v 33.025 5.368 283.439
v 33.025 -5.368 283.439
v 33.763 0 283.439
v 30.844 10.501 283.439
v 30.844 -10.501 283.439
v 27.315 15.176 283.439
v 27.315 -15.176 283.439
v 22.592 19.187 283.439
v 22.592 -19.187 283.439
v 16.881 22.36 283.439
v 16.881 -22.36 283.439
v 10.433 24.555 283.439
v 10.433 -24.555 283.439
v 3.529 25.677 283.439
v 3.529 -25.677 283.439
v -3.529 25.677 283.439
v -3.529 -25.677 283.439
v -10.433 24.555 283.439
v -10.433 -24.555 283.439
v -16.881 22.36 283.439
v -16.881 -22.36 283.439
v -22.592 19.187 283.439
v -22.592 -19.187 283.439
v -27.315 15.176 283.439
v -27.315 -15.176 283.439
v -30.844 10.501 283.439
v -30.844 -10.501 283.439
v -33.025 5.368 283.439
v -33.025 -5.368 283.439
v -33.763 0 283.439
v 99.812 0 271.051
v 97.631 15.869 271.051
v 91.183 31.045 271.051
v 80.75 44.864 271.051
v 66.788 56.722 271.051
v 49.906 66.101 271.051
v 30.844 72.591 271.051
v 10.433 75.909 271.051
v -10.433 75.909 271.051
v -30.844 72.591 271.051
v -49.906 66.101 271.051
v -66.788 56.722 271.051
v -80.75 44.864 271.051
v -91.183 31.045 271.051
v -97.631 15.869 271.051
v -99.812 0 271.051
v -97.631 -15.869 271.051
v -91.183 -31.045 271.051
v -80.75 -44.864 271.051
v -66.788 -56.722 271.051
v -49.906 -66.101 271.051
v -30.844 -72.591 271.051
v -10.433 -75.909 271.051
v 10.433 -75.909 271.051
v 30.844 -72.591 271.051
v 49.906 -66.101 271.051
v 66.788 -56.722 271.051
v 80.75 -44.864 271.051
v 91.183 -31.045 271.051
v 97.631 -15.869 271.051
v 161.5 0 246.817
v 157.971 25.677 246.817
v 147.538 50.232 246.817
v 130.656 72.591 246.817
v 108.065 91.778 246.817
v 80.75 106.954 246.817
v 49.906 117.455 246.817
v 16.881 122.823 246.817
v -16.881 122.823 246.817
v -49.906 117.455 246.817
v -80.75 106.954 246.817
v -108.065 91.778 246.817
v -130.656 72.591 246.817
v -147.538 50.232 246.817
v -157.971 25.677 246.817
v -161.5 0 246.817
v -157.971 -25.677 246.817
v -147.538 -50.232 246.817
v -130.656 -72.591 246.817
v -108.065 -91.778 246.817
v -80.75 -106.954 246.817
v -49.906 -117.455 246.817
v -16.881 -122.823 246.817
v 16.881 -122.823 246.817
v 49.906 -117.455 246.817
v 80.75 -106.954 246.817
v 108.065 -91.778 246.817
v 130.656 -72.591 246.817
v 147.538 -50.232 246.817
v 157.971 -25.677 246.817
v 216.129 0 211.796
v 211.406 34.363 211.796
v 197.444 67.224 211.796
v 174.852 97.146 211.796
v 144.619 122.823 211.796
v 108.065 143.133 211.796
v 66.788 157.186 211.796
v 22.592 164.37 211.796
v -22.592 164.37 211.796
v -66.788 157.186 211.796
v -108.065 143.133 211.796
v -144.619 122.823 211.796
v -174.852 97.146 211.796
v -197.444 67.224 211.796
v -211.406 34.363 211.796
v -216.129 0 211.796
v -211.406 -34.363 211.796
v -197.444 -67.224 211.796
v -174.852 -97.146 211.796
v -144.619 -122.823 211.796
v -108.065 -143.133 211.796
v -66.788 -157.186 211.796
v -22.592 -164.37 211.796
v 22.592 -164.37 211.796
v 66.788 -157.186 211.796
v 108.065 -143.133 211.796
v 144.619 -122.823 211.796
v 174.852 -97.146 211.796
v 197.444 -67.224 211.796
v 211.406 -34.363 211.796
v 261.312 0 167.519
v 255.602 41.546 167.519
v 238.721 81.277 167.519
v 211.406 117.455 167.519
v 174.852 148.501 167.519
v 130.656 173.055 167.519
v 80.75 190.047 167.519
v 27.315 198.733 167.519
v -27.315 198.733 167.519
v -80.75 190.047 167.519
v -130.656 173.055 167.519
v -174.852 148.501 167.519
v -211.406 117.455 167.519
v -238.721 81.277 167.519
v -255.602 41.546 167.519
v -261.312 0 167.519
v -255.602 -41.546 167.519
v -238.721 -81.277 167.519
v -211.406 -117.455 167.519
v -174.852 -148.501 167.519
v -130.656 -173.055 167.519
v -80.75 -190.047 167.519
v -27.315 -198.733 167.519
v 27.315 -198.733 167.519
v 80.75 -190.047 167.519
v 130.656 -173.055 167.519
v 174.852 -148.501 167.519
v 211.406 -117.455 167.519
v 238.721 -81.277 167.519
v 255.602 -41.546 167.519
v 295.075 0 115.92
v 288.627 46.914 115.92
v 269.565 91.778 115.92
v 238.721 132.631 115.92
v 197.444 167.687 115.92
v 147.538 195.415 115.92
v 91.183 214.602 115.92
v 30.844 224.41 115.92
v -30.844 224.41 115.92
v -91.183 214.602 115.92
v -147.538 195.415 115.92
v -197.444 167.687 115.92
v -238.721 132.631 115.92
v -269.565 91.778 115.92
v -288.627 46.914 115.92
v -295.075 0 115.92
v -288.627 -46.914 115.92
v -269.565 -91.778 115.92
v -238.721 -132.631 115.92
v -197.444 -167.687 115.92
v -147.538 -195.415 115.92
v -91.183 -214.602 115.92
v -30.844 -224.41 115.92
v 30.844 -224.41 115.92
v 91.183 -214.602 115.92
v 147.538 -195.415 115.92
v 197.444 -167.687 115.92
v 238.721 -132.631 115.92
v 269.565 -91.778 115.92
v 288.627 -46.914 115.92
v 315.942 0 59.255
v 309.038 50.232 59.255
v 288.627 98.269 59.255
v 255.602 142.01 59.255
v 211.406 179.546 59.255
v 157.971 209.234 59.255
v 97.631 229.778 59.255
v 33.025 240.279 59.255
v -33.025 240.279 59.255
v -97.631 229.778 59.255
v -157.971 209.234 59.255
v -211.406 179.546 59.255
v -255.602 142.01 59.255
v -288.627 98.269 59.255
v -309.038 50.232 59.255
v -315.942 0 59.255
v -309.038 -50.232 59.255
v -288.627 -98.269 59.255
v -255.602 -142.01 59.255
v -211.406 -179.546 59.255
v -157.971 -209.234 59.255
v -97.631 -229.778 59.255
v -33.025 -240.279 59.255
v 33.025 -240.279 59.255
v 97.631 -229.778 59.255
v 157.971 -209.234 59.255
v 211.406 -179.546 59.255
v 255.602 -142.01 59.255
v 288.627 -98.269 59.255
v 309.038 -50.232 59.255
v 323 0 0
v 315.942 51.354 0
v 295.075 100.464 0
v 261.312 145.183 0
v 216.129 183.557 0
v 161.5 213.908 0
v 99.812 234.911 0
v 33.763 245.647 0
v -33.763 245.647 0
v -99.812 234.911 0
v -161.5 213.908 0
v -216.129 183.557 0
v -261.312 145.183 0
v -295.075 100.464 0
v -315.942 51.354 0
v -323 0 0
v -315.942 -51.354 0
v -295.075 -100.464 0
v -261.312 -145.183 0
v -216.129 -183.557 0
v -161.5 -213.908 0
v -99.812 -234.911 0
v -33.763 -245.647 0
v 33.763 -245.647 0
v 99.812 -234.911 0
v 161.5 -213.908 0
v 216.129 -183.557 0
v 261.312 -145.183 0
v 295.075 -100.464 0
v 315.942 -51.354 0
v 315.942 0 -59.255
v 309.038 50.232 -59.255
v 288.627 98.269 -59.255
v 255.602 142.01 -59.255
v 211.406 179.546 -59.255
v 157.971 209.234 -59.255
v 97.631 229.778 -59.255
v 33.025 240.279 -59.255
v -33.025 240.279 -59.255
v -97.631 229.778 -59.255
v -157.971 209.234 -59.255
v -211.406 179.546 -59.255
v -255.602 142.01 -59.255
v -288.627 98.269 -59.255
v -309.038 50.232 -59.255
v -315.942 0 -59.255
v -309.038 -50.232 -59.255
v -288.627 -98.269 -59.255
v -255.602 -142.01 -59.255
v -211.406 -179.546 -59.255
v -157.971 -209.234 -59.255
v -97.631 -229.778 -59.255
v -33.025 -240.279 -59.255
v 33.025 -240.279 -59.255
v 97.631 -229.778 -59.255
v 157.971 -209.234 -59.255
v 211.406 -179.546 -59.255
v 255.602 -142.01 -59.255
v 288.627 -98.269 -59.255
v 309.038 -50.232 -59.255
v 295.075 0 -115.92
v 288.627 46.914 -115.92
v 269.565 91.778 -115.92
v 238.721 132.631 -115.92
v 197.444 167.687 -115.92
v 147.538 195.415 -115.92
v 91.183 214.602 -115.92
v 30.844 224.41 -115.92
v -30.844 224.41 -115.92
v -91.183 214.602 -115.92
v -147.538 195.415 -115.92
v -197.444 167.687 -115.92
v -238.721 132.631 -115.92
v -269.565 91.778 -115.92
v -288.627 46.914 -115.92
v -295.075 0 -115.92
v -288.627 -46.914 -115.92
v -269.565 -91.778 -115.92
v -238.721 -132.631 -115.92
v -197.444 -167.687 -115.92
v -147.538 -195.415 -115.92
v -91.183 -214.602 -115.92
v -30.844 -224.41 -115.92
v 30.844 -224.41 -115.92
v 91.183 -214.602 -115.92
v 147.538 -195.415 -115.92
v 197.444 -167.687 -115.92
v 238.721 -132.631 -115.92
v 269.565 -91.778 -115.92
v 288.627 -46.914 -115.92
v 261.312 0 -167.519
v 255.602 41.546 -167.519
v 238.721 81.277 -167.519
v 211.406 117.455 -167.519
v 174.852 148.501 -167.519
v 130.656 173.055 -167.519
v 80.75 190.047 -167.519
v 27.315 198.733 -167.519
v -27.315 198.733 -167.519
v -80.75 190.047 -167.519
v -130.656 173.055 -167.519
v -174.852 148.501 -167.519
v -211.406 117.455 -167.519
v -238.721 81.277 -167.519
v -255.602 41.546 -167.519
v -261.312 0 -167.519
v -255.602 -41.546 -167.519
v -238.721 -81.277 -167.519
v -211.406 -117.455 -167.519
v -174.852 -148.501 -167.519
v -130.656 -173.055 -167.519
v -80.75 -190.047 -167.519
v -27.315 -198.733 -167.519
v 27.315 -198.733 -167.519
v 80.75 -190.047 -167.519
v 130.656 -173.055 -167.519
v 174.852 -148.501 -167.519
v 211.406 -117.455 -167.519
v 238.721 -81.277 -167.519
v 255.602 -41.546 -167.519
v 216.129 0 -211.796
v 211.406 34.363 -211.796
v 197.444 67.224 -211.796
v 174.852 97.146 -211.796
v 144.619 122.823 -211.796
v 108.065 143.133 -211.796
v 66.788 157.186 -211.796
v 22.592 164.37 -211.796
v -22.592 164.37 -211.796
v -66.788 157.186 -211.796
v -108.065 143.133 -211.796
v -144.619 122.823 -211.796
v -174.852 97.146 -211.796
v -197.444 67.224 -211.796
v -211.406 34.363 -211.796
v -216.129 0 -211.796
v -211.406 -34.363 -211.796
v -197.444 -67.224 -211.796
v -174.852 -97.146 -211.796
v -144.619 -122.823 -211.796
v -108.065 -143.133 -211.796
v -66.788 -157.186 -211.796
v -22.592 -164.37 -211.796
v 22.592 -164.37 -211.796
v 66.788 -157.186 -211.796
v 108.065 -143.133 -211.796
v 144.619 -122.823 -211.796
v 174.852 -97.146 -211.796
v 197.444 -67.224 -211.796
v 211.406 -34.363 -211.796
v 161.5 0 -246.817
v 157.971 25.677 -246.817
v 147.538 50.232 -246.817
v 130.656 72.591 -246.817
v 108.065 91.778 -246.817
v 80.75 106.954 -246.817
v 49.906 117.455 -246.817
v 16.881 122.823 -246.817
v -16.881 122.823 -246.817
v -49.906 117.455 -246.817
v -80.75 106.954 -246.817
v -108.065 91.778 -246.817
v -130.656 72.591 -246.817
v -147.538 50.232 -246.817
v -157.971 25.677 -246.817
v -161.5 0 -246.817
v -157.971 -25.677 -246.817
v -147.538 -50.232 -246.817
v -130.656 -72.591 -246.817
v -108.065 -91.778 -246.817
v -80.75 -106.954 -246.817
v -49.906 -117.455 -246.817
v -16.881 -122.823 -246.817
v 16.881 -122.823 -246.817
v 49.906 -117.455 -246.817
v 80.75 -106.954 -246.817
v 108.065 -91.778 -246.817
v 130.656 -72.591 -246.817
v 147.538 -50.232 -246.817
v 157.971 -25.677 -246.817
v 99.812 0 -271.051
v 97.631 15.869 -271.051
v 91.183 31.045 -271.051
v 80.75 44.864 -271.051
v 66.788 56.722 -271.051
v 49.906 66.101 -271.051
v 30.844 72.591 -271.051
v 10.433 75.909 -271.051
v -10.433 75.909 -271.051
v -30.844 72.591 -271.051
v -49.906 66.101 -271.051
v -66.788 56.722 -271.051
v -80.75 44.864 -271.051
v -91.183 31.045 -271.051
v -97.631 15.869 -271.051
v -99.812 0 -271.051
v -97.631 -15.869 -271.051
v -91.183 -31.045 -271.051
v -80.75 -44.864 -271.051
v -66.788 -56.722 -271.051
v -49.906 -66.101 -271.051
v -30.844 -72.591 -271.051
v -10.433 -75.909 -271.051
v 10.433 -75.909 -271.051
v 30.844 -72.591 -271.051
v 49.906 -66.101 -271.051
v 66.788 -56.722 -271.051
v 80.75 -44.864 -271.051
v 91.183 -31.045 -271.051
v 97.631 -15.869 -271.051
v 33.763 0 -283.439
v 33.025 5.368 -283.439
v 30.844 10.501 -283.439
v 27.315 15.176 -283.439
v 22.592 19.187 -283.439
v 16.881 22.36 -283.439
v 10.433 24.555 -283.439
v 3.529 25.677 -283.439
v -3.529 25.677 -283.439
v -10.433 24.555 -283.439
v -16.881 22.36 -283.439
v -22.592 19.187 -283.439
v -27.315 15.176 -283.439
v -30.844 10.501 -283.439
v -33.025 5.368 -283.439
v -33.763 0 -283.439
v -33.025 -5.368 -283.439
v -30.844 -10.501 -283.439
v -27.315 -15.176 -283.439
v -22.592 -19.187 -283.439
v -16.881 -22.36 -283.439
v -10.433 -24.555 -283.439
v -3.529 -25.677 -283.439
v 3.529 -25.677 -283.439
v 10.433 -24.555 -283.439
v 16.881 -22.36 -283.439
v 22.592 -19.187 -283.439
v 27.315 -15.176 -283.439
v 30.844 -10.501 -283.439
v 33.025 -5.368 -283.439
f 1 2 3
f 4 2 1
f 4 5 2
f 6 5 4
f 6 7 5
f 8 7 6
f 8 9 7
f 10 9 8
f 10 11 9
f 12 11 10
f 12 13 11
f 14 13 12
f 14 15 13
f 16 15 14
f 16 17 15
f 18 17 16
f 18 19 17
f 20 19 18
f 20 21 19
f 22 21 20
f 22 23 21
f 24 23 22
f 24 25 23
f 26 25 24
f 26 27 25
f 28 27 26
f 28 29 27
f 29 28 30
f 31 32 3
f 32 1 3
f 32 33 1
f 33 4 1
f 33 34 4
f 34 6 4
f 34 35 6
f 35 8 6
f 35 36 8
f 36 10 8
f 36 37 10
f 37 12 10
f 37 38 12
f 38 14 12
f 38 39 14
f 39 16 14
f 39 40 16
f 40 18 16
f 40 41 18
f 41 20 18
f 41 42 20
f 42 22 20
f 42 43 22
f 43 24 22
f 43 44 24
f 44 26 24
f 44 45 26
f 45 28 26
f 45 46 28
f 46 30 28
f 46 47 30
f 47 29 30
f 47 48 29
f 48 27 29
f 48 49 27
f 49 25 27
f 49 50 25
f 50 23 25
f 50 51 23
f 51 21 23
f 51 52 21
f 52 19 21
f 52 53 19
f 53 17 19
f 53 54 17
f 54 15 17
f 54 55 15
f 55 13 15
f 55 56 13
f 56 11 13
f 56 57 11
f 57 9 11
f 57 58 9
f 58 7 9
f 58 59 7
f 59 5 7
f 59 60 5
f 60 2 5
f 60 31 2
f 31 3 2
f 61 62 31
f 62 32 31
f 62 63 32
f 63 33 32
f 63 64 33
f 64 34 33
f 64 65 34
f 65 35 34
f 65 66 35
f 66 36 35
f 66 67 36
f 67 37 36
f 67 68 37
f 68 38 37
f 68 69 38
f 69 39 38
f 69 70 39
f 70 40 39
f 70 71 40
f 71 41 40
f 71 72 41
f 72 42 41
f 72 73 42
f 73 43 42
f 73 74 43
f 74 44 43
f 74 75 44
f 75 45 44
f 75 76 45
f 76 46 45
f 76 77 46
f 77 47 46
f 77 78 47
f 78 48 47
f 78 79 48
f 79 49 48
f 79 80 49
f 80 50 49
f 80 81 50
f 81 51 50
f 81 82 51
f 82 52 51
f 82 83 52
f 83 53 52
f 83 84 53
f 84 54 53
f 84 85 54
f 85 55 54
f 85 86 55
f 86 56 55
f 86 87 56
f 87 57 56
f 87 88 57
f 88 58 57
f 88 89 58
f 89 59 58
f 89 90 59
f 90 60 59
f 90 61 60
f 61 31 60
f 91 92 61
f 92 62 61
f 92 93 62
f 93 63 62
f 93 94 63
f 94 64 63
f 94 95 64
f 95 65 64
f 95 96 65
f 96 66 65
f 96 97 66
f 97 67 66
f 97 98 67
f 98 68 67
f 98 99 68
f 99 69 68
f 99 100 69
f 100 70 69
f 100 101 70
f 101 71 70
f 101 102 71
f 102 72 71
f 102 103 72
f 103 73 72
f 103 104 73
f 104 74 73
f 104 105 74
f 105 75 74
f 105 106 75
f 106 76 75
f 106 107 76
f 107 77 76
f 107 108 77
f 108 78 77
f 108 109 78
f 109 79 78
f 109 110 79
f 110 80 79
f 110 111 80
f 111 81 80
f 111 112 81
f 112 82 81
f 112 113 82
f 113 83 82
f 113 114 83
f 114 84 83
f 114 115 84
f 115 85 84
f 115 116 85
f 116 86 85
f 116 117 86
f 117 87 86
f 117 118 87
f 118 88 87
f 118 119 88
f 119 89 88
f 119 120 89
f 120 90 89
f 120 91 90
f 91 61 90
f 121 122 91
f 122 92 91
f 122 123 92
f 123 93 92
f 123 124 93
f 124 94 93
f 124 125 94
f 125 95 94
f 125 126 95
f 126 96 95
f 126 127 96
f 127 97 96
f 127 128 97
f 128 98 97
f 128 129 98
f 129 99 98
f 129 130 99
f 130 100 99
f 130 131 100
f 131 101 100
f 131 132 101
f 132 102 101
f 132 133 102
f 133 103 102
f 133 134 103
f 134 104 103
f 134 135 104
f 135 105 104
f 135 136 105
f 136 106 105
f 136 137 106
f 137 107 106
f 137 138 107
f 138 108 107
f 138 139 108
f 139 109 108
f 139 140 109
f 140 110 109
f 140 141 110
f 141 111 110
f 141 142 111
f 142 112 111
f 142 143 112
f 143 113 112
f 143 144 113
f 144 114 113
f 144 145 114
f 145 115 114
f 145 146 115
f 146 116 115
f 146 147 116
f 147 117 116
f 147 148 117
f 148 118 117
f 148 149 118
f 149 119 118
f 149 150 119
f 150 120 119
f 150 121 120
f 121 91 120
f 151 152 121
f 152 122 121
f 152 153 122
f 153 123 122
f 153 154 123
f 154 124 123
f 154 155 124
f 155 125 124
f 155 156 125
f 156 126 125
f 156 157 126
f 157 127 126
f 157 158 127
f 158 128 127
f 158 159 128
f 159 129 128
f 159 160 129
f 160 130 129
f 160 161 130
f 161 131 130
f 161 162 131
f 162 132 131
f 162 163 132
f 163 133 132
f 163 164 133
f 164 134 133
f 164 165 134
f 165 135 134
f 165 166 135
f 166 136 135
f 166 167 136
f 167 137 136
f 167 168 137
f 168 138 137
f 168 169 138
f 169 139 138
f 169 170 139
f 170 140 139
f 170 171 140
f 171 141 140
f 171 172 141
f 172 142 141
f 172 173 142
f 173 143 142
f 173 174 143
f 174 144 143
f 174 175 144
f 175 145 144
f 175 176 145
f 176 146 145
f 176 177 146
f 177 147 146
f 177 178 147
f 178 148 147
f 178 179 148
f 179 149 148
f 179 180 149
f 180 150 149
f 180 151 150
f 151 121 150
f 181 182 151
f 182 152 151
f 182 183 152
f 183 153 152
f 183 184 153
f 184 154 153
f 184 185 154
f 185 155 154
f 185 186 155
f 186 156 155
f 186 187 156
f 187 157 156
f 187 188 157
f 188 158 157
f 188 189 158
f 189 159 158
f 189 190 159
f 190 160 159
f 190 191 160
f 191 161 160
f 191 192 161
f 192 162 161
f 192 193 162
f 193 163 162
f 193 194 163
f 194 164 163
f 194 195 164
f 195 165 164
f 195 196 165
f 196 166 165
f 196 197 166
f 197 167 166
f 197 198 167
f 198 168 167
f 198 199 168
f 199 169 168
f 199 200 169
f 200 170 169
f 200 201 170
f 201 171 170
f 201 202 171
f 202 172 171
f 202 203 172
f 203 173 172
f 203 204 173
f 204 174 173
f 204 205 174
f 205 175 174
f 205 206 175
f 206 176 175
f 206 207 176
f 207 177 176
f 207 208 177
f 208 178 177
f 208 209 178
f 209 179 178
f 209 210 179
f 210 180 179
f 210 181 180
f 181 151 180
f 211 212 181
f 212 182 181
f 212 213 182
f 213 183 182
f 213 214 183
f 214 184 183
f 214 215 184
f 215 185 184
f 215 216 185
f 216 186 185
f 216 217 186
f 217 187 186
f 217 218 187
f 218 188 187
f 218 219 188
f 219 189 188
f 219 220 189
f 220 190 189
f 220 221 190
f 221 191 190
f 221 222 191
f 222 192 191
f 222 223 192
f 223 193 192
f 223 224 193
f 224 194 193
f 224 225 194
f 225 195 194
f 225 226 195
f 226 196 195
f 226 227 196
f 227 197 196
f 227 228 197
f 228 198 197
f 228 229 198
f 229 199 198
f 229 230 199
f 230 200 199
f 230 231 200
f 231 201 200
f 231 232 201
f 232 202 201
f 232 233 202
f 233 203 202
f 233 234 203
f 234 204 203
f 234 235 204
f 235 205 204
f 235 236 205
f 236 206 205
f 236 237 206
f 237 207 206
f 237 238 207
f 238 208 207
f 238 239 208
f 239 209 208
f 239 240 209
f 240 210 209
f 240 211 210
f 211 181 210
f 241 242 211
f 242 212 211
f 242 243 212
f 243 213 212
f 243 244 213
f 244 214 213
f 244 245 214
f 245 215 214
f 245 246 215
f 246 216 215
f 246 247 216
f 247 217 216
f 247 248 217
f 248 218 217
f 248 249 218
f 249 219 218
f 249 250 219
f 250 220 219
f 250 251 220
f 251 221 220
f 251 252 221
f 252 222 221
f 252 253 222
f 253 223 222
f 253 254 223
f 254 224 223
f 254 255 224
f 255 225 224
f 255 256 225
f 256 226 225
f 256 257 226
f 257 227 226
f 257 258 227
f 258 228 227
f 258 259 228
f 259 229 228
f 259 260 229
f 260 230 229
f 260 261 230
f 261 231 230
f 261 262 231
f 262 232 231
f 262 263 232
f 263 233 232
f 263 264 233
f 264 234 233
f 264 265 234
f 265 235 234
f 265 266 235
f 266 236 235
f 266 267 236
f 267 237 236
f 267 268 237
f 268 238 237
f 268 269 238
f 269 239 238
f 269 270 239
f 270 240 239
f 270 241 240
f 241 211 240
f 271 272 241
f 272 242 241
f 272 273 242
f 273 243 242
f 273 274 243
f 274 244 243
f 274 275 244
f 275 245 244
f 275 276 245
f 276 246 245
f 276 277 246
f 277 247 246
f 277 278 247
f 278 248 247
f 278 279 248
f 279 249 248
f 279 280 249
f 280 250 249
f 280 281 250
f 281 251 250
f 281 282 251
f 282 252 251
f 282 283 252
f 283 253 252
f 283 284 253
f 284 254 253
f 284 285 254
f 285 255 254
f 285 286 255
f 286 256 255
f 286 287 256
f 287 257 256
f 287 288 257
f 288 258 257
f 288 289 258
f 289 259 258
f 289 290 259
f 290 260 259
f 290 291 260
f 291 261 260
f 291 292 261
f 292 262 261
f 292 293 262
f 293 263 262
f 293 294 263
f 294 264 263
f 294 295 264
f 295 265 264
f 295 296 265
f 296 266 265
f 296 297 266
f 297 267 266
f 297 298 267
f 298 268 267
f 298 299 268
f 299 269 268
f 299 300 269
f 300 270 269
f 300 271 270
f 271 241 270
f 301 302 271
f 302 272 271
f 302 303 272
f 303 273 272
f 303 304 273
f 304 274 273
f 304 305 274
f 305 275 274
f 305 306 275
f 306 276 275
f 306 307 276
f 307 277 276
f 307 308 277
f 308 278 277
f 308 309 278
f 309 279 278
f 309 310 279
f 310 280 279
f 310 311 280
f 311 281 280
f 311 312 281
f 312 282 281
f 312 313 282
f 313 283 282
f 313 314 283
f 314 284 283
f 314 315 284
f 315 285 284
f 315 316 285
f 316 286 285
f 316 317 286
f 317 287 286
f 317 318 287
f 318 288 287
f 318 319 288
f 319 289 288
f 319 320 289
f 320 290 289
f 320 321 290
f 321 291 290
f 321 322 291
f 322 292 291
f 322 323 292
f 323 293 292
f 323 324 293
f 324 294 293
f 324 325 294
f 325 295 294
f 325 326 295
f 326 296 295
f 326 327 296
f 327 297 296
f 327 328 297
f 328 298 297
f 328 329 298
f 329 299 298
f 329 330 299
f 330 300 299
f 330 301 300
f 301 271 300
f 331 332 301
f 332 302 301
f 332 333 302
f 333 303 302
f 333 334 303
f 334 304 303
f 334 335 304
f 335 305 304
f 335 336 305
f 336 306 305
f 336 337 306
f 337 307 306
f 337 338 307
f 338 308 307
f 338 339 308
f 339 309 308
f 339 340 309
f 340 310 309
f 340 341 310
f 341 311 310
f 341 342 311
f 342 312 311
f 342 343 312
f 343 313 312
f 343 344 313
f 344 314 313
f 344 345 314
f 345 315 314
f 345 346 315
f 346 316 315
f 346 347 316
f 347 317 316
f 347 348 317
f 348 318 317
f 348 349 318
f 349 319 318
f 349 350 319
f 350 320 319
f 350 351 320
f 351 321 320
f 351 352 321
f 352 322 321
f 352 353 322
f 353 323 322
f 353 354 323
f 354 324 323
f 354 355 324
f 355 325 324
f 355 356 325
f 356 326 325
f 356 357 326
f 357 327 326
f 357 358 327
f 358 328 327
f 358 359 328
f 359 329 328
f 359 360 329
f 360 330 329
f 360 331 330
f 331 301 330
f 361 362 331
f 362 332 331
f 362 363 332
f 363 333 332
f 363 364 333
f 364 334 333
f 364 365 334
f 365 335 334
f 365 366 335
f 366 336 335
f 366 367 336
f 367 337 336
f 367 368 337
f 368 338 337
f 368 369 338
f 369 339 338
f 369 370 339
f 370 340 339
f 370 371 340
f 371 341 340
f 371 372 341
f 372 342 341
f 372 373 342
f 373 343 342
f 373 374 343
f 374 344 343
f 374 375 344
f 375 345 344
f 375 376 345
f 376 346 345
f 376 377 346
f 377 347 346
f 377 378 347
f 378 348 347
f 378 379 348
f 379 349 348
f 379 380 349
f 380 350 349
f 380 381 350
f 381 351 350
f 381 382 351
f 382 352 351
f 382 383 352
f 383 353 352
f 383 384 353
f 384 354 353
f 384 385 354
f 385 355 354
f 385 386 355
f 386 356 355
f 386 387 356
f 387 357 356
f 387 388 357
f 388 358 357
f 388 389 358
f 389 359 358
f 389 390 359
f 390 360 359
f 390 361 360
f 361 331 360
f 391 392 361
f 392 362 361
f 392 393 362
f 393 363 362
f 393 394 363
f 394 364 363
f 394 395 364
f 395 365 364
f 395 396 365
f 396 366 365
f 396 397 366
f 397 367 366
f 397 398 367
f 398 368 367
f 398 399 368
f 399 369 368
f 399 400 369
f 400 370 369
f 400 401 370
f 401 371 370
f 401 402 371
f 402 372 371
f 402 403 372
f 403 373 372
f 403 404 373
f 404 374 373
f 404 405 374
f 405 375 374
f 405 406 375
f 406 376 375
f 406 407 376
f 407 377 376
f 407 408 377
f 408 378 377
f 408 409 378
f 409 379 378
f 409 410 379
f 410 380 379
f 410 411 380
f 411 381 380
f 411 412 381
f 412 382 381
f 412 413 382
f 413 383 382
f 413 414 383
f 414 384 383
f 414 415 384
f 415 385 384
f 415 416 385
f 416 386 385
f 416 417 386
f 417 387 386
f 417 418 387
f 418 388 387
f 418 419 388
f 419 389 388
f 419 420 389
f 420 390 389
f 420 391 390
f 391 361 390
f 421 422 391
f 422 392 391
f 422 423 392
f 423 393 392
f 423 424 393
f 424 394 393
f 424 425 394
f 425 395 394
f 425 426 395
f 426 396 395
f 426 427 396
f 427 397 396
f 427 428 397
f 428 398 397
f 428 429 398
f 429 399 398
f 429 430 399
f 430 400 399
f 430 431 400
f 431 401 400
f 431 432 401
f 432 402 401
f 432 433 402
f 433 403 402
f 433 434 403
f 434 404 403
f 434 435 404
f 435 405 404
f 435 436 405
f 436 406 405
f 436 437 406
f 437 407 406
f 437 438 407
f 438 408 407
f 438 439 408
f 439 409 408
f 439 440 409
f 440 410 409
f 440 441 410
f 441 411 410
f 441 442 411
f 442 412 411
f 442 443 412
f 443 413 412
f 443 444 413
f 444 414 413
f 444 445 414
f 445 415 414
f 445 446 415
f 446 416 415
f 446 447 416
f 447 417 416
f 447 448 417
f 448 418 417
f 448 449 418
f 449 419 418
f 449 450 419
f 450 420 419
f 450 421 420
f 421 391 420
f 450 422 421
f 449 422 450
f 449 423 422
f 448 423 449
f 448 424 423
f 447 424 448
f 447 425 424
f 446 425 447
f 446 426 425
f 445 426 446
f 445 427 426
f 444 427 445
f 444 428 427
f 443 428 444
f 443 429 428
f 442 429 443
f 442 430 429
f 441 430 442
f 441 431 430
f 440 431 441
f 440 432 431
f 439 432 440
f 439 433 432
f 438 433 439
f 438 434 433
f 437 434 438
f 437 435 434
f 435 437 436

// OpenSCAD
// Generated by SolidPython 1.0.1 on 2020-07-29 00:46:53


scale(v = [17, 13, 15]) {
	sphere(r = 19);
}
/***********************************************
*********      SolidPython code:      **********
************************************************
 
# import packages: SolidPython
from solid import *
from solid.utils import *
from itertools import chain, combinations, permutations


class Resize:

    def __init__(self, scad_file):
        self.scad_file = scad_file
        #self.scad_file = import_scad(scad_file)
        # cone/cylinder param:
        self.r1 = 0
        self.r2 = 0
        self.h = 0
        # rectangular prism param:
        self.w = 0
        self.l = 0
        # ellipse param:
        self.r = 0

    # import OpenScad code (file name corresponds to shape)


    # classify shape + parameters
    def assign(self, param1, param2, param3):
        if self.scad_file == 'cone.scad':
            self.r1 = param1
            self.r2 = param2
            self.h = param3
        elif self.scad_file == 'cylinder.scad':
            self.r1 = param1
            self.r2 = param2
            self.h = param3
        elif self.scad_file == 'rectangularPrism.scad':
            self.h = param1
            self.l = param2
            self.w = param3
        else:
            self.r = param1
            self.h = param2

    # resize parameters
    def iterate(self):
        x = range(3, 20, 2)
        i = 1
        if self.scad_file == 'cone.scad':
            tempList = list(permutations(x, 2))
            for temp in tempList:
                param1 = temp[0]
                param2 = temp[1]
                filepath = 'produced_scad_files/' + 'cone' + str(param1) + '_' + str(param2) + '_' + '.scad'
                scad_render_to_file(cylinder(h=param1, r1=param2, r2=0), filepath)

        elif self.scad_file == 'cylinder.scad':
            tempList = list(permutations(x, 3))
            for temp in tempList:
                param1 = temp[0]
                param2 = temp[1]
                filepath = 'produced_scad_files/' + 'cylinder' + str(param1) + '_' + str(param2) + '_' + '.scad'
                scad_render_to_file(cylinder(h=param1, r1=param2, r2=param2), filepath)

        elif self.scad_file == 'rectangularPrism.scad':
            tempList = list(permutations(x, 3))
            for temp in tempList:
                param1 = temp[0]
                param2 = temp[1]
                param3 = temp[2]
                filepath = 'produced_scad_files/' + 'rectangularPrism' + str(param1) + '_' + str(param2) + '_' + str(
                    param3) + '.scad'
                scad_render_to_file(cube(size=(param1, param2, param3)), filepath)

        elif self.scad_file == 'ellipse.scad':
            tempList = list(permutations(x, 4))
            for temp in tempList:
                param1 = temp[0]
                param2 = temp[1]
                param3 = temp[2]
                param4 = temp[3]
                filepath = 'produced_scad_files/' + 'ellipse' + str(param1) + '_' + str(param2) + '_' + str(param3) + '_' + str(param4) + '.scad'
                scad_render_to_file(scale([param1, param2, param3])(sphere(r=param4)), filepath)

    def render_to_scadfile(self):
        scad_render_to_file(scad, 'example.scad') 
 
************************************************/
